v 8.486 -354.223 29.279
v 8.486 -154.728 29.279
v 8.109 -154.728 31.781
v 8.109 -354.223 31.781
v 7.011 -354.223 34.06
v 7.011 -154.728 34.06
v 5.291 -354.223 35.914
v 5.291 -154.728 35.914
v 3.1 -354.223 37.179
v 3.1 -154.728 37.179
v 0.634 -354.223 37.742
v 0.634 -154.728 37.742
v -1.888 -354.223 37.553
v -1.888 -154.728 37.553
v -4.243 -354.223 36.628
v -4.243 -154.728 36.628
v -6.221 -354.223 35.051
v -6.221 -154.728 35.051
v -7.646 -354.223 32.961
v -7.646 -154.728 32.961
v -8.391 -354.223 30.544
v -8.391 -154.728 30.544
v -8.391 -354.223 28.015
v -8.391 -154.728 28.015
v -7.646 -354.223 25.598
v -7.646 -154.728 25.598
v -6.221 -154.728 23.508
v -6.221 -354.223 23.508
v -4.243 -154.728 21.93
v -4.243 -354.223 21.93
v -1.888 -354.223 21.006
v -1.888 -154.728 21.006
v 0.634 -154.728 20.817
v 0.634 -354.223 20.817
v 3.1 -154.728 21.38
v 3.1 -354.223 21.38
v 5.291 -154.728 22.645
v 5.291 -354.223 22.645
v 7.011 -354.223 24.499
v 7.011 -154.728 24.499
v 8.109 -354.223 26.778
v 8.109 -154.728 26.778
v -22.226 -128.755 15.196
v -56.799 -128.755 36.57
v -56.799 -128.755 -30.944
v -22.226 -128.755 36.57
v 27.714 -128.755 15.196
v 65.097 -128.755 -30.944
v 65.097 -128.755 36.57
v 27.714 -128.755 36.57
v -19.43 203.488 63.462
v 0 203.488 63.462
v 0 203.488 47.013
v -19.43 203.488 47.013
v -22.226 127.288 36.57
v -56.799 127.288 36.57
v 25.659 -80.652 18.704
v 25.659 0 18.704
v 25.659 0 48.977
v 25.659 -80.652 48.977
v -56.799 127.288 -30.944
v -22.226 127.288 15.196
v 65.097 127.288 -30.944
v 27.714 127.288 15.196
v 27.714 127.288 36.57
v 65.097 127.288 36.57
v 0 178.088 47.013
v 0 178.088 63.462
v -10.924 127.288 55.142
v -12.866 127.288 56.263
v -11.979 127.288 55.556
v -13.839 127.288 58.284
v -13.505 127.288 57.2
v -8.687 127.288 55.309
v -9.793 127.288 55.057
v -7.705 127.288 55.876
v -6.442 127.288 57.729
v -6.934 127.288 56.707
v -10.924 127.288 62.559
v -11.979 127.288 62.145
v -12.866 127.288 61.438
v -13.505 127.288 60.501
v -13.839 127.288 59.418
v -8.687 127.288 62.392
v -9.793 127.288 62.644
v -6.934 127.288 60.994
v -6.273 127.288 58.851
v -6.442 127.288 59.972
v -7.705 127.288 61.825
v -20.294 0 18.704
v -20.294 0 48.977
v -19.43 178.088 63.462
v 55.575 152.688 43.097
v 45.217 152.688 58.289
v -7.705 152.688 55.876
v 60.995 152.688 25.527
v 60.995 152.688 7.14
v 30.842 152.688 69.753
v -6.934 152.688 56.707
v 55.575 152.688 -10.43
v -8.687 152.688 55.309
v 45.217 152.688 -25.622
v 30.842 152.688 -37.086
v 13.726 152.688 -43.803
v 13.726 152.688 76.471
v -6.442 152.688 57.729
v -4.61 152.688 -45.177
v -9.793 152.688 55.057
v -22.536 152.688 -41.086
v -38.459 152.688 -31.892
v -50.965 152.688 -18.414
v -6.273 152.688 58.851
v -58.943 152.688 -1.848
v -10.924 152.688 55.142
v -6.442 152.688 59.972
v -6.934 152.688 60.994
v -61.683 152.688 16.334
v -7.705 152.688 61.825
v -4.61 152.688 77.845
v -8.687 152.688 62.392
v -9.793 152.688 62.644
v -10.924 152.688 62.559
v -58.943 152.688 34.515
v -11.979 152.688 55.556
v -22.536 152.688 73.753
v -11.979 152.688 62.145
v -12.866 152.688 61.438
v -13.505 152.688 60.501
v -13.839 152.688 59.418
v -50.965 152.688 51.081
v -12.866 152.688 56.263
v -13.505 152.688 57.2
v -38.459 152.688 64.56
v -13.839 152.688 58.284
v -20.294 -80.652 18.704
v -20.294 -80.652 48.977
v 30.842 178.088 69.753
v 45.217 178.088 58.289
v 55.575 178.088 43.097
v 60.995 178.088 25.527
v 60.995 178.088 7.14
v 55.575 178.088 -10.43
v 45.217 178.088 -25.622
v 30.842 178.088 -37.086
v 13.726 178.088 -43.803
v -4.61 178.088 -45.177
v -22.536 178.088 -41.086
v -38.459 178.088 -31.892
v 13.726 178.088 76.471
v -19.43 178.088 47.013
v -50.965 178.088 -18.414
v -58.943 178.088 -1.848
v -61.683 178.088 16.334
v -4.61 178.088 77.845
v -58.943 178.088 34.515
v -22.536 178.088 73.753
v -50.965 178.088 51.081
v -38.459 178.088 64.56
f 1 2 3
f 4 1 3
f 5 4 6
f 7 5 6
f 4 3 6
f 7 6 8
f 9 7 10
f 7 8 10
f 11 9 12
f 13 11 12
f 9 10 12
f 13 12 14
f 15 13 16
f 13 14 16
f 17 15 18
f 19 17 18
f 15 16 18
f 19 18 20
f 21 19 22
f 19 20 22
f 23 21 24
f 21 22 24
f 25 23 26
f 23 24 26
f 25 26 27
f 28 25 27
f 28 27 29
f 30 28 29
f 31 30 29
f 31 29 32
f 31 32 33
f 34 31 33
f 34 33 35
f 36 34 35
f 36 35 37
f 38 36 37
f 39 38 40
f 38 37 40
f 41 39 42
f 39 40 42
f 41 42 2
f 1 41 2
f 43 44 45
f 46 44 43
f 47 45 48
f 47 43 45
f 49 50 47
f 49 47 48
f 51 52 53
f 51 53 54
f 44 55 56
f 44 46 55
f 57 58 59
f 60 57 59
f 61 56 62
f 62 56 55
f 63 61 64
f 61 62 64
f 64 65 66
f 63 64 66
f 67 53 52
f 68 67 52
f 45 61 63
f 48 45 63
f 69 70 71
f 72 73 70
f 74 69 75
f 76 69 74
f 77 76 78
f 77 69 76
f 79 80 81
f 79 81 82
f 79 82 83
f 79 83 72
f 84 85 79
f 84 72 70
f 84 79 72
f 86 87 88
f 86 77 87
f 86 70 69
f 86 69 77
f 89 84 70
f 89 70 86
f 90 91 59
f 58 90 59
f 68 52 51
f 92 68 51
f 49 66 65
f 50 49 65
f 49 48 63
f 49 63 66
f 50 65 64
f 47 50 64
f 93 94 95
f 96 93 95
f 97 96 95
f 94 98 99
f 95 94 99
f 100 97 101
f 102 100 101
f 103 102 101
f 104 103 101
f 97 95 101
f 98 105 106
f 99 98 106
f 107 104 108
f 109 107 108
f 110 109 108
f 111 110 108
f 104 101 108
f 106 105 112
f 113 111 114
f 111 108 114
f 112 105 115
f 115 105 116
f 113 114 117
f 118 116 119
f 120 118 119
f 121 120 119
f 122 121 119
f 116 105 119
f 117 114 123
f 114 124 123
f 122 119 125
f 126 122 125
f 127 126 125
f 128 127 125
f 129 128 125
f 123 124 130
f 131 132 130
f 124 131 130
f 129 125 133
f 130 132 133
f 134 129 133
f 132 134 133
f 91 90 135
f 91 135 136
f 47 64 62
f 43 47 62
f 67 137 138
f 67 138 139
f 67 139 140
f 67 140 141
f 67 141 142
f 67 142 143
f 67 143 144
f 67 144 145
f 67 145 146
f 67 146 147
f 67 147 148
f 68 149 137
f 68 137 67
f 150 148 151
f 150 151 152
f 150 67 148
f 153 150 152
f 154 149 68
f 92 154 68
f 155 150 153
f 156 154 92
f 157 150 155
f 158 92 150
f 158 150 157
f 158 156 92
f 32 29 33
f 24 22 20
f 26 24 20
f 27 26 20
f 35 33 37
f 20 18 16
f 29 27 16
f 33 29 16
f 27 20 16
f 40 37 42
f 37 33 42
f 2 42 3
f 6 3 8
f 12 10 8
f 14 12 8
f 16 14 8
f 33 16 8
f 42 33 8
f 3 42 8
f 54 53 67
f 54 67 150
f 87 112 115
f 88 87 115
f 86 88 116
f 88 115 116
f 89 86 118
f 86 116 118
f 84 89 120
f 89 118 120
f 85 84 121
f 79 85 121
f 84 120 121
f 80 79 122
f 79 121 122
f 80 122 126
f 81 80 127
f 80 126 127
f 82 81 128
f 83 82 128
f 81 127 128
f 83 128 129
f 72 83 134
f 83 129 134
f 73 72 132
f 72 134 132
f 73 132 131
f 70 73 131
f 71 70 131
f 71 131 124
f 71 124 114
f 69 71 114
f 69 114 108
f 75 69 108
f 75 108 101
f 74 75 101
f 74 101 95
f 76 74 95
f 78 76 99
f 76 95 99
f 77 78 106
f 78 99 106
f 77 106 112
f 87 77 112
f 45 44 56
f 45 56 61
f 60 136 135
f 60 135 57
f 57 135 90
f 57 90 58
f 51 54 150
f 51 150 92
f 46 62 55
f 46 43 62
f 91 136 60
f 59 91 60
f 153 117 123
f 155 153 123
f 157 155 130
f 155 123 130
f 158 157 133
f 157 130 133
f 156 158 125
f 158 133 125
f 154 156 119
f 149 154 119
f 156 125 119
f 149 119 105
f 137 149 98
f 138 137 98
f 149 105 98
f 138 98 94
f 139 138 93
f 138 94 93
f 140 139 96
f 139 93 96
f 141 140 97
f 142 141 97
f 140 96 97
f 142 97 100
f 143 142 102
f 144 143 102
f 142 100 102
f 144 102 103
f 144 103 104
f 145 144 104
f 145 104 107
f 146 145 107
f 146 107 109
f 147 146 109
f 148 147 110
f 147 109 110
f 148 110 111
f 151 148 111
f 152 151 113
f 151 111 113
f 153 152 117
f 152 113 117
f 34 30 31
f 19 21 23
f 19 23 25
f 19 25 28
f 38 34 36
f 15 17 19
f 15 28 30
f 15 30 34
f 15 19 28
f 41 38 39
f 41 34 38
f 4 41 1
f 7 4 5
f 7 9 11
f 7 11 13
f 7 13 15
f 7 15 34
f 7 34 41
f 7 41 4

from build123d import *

# Parameters (mm, degrees)
F1_DEPTH  = 128.7553142756
F2_DEPTH  = 127.2883359343
F3_W      = 45.9532290697
F3_H      = 30.2736908197
F4_DEPTH  = 80.6518737227
F6_R      = 8.4859064115
F7_DEPTH  = 199.4947325438
F9_R      = 61.6834852397
F10_DEPTH = 25.4
F11_W     = 19.4302052259
F11_H     = 16.4499357343
F12_DEPTH = 25.4
F13_R     = 3.8043092938
F14_DEPTH = 25.4


with BuildPart() as f1:
    # F0 (on Front) → F1 (new body)
    with BuildSketch(Plane.XZ):
        Polygon((-22.2257003188, 36.5697443485), (-56.7990168929, 36.5697443485), (-56.7990168929, -30.943825841), (65.0972872972, -30.943825841), (65.0972872972, 36.5697443485), (27.7135372162, 36.5697443485), (27.7135372162, 15.1959657669), (-22.2257003188, 15.1959657669), align=None)
    extrude(amount=F1_DEPTH)

    # F2 (add): a face of the model
    f2_faces = [f1.faces().sort_by_distance(p)[0] for p in [
        (4.3585542487, 0, -0.6251406493),
    ]]
    extrude(f2_faces, amount=F2_DEPTH)


with BuildPart() as f4:
    # F3 (on Front) → F4 (new body)
    with BuildSketch(Plane.XZ):
        with Locations((2.6821345091, 33.8404327631)):
            Rectangle(F3_W, F3_H)
    extrude(amount=F4_DEPTH)


with BuildPart() as f7:
    # F6 (on offset) → F7 (new body)
    with BuildSketch(Plane.XZ.offset(154.7280419618)):
        with Locations((0, 29.2794629931)):
            Circle(F6_R)
    extrude(amount=F7_DEPTH)


with BuildPart() as f10:
    # F9 (on offset) → F10 (new body)
    with BuildSketch(Plane(origin=(0, 152.6883359343, 0), x_dir=(-1, 0, 0), z_dir=(0, 1, 0))):
        with Locations((0, 16.3338258862)):
            Circle(F9_R)
    extrude(amount=F10_DEPTH)

    # F11 (on face) → F12 (join)
    with BuildSketch(Plane(origin=(0, 178.0883359343, 0), x_dir=(-1, 0, 0), z_dir=(0, 1, 0))):
        with Locations((9.715102613, 55.2375279367)):
            Rectangle(F11_W, F11_H)
    extrude(amount=F12_DEPTH)

    # F13 (on face) → F14 (join)
    with BuildSketch(Plane.XZ.offset(-152.6883359343)):
        with Locations((-10.077342391, 58.8505342603)):
            Circle(F13_R)
    extrude(amount=F14_DEPTH)


solid = Compound([f1.part, f4.part, f7.part, f10.part])
